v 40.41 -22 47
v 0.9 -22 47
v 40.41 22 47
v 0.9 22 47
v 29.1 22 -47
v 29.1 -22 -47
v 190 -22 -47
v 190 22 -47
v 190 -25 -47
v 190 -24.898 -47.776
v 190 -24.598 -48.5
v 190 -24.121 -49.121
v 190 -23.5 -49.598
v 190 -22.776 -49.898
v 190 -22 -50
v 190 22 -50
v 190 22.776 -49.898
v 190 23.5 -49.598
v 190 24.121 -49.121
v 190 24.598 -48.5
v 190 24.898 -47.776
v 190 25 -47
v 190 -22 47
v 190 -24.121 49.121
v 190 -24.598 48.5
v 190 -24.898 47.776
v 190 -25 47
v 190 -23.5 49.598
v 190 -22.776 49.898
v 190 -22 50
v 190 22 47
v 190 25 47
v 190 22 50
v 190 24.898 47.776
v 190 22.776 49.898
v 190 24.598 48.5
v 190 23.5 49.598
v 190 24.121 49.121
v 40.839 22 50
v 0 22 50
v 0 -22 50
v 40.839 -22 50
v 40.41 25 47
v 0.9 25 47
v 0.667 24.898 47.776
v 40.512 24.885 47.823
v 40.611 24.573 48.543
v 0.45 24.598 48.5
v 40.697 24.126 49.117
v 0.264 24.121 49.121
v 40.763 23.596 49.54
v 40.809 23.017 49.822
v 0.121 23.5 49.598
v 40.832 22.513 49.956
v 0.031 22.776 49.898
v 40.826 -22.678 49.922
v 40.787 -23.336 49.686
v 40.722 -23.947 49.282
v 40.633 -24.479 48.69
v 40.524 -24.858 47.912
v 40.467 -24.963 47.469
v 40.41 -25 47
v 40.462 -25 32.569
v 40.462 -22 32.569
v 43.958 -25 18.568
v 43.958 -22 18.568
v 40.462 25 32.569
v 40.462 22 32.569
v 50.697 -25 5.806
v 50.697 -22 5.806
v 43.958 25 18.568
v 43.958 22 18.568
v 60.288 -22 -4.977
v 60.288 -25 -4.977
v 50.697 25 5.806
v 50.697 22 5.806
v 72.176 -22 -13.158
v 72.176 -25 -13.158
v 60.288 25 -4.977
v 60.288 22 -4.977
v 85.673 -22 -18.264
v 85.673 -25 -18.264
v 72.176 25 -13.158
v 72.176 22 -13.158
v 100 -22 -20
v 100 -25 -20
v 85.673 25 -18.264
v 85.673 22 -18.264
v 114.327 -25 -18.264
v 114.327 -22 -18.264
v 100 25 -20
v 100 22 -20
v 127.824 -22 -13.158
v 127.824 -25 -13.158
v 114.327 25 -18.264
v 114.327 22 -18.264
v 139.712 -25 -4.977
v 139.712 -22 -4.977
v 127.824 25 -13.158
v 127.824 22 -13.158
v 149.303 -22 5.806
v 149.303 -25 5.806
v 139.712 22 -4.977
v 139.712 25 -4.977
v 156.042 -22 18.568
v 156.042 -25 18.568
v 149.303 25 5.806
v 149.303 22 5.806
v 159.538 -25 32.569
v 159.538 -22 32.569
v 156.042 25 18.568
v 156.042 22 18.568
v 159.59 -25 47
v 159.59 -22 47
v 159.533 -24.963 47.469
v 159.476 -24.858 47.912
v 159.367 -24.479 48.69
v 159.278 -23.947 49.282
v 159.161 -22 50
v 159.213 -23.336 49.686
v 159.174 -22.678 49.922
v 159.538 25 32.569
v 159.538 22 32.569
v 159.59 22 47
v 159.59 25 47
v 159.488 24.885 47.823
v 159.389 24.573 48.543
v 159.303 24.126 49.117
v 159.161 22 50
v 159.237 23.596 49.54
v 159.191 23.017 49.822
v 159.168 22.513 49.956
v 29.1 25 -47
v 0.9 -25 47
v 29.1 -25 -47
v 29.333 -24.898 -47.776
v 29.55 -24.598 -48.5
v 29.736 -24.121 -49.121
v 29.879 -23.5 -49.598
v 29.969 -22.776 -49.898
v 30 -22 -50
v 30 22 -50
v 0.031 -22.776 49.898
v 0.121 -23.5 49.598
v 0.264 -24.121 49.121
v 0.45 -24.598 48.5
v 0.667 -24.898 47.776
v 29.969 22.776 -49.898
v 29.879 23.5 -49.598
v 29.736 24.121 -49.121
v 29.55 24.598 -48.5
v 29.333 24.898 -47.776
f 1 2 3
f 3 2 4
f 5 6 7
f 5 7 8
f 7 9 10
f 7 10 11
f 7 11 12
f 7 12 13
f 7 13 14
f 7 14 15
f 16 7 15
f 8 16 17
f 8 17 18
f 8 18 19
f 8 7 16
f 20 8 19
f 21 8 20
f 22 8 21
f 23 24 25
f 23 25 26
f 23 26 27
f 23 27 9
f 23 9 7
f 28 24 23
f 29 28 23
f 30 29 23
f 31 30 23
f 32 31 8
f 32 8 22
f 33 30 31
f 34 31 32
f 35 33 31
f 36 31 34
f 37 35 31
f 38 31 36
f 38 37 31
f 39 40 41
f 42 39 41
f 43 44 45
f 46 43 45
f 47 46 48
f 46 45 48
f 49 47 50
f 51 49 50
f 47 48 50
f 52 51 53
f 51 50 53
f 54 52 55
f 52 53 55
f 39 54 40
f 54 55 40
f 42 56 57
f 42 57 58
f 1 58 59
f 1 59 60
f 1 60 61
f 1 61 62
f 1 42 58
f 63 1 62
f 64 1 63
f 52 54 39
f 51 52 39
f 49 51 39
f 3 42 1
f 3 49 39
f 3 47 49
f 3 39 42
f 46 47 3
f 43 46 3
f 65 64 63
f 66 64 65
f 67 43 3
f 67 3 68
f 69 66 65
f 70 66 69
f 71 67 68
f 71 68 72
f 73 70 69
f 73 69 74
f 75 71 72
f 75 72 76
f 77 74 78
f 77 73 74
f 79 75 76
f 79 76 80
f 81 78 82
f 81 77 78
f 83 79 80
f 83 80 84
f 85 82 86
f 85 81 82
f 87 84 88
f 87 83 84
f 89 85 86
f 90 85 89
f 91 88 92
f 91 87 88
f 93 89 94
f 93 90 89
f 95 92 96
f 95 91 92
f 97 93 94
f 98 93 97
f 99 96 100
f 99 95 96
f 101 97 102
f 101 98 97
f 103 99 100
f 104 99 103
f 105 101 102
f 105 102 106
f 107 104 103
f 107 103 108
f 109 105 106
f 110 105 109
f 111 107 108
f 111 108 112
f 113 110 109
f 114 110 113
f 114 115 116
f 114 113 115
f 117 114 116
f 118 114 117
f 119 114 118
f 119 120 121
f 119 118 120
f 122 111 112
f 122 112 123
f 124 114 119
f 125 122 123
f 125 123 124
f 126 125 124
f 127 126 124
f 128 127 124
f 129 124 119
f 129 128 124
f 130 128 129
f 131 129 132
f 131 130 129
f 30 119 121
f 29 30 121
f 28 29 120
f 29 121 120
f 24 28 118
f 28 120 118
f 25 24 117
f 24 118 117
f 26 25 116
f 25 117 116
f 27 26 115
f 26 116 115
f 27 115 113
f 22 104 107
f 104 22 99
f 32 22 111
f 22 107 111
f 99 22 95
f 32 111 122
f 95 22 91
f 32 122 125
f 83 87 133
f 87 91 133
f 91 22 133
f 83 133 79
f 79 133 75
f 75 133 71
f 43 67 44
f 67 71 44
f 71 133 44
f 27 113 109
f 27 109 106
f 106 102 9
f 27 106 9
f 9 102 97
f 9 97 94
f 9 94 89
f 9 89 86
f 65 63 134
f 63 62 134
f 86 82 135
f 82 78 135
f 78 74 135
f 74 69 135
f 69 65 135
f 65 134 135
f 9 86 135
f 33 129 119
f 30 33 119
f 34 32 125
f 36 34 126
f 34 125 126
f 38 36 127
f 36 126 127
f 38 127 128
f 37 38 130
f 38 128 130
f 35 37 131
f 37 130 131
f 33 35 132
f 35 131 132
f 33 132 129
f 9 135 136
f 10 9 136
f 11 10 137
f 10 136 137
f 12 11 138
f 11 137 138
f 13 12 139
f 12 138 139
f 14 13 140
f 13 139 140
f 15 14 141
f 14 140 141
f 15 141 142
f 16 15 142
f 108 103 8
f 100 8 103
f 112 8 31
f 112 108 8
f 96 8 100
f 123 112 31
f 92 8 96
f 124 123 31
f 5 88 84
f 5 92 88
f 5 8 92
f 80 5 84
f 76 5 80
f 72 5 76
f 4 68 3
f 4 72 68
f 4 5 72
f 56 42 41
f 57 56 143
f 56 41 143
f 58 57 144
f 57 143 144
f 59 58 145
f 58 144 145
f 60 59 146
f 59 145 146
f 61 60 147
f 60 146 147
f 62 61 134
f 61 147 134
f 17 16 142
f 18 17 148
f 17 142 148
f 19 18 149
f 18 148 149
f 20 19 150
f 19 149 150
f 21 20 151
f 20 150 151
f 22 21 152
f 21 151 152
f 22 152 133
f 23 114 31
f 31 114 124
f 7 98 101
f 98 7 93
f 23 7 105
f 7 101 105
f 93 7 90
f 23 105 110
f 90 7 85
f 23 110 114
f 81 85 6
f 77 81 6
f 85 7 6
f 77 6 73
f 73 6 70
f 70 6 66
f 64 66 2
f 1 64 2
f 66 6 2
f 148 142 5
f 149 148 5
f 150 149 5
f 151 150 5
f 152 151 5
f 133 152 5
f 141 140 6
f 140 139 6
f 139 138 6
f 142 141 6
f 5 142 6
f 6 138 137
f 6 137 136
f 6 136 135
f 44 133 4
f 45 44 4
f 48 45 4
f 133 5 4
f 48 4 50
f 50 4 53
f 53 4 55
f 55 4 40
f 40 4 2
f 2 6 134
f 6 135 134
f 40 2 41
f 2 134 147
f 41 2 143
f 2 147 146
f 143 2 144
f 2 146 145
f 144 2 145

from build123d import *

# Parameters (mm, degrees)
F0_W          = 44
F0_H          = 94
F1_DEPTH      = 190
F3_DEPTH      = 25.001
F3_DEPTH_BACK = 25.001
F5_DEPTH      = 25.001
F5_DEPTH_BACK = 25.001


with BuildPart() as f1:
    # F0 (on Right) → F1 (new body)
    with BuildSketch(Plane.YZ):
        with BuildLine():
            Line((22, 50), (-22, 50))
            ThreePointArc((-22, 50), (-24.12132, 49.12132), (-25, 47))
            Line((-25, 47), (-25, -47))
            ThreePointArc((-25, -47), (-24.12132, -49.12132), (-22, -50))
            Line((-22, -50), (22, -50))
            ThreePointArc((22, -50), (24.12132, -49.12132), (25, -47))
            Line((25, -47), (25, 47))
            ThreePointArc((25, 47), (24.12132, 49.12132), (22, 50))
        make_face()
        Rectangle(F0_W, F0_H, mode=Mode.SUBTRACT)
    extrude(amount=F1_DEPTH)

    # F2 (on Front) → F3 (cut, two sides)
    with BuildSketch(Plane.XZ) as f3_sk:
        Polygon((30, -50), (0, 50), (0, -50), align=None)
    extrude(amount=F3_DEPTH, mode=Mode.SUBTRACT)
    extrude(f3_sk.sketch, amount=-F3_DEPTH_BACK, mode=Mode.SUBTRACT)

    # F4 (on Front) → F5 (cut, two sides)
    with BuildSketch(Plane.XZ) as f5_sk:
        with BuildLine():
            Line((159.160798, 50), (40.839202, 50))
            ThreePointArc((40.839202, 50), (100, -20), (159.160798, 50))
        make_face()
    extrude(amount=F5_DEPTH, mode=Mode.SUBTRACT)
    extrude(f5_sk.sketch, amount=-F5_DEPTH_BACK, mode=Mode.SUBTRACT)


solid = f1.part
